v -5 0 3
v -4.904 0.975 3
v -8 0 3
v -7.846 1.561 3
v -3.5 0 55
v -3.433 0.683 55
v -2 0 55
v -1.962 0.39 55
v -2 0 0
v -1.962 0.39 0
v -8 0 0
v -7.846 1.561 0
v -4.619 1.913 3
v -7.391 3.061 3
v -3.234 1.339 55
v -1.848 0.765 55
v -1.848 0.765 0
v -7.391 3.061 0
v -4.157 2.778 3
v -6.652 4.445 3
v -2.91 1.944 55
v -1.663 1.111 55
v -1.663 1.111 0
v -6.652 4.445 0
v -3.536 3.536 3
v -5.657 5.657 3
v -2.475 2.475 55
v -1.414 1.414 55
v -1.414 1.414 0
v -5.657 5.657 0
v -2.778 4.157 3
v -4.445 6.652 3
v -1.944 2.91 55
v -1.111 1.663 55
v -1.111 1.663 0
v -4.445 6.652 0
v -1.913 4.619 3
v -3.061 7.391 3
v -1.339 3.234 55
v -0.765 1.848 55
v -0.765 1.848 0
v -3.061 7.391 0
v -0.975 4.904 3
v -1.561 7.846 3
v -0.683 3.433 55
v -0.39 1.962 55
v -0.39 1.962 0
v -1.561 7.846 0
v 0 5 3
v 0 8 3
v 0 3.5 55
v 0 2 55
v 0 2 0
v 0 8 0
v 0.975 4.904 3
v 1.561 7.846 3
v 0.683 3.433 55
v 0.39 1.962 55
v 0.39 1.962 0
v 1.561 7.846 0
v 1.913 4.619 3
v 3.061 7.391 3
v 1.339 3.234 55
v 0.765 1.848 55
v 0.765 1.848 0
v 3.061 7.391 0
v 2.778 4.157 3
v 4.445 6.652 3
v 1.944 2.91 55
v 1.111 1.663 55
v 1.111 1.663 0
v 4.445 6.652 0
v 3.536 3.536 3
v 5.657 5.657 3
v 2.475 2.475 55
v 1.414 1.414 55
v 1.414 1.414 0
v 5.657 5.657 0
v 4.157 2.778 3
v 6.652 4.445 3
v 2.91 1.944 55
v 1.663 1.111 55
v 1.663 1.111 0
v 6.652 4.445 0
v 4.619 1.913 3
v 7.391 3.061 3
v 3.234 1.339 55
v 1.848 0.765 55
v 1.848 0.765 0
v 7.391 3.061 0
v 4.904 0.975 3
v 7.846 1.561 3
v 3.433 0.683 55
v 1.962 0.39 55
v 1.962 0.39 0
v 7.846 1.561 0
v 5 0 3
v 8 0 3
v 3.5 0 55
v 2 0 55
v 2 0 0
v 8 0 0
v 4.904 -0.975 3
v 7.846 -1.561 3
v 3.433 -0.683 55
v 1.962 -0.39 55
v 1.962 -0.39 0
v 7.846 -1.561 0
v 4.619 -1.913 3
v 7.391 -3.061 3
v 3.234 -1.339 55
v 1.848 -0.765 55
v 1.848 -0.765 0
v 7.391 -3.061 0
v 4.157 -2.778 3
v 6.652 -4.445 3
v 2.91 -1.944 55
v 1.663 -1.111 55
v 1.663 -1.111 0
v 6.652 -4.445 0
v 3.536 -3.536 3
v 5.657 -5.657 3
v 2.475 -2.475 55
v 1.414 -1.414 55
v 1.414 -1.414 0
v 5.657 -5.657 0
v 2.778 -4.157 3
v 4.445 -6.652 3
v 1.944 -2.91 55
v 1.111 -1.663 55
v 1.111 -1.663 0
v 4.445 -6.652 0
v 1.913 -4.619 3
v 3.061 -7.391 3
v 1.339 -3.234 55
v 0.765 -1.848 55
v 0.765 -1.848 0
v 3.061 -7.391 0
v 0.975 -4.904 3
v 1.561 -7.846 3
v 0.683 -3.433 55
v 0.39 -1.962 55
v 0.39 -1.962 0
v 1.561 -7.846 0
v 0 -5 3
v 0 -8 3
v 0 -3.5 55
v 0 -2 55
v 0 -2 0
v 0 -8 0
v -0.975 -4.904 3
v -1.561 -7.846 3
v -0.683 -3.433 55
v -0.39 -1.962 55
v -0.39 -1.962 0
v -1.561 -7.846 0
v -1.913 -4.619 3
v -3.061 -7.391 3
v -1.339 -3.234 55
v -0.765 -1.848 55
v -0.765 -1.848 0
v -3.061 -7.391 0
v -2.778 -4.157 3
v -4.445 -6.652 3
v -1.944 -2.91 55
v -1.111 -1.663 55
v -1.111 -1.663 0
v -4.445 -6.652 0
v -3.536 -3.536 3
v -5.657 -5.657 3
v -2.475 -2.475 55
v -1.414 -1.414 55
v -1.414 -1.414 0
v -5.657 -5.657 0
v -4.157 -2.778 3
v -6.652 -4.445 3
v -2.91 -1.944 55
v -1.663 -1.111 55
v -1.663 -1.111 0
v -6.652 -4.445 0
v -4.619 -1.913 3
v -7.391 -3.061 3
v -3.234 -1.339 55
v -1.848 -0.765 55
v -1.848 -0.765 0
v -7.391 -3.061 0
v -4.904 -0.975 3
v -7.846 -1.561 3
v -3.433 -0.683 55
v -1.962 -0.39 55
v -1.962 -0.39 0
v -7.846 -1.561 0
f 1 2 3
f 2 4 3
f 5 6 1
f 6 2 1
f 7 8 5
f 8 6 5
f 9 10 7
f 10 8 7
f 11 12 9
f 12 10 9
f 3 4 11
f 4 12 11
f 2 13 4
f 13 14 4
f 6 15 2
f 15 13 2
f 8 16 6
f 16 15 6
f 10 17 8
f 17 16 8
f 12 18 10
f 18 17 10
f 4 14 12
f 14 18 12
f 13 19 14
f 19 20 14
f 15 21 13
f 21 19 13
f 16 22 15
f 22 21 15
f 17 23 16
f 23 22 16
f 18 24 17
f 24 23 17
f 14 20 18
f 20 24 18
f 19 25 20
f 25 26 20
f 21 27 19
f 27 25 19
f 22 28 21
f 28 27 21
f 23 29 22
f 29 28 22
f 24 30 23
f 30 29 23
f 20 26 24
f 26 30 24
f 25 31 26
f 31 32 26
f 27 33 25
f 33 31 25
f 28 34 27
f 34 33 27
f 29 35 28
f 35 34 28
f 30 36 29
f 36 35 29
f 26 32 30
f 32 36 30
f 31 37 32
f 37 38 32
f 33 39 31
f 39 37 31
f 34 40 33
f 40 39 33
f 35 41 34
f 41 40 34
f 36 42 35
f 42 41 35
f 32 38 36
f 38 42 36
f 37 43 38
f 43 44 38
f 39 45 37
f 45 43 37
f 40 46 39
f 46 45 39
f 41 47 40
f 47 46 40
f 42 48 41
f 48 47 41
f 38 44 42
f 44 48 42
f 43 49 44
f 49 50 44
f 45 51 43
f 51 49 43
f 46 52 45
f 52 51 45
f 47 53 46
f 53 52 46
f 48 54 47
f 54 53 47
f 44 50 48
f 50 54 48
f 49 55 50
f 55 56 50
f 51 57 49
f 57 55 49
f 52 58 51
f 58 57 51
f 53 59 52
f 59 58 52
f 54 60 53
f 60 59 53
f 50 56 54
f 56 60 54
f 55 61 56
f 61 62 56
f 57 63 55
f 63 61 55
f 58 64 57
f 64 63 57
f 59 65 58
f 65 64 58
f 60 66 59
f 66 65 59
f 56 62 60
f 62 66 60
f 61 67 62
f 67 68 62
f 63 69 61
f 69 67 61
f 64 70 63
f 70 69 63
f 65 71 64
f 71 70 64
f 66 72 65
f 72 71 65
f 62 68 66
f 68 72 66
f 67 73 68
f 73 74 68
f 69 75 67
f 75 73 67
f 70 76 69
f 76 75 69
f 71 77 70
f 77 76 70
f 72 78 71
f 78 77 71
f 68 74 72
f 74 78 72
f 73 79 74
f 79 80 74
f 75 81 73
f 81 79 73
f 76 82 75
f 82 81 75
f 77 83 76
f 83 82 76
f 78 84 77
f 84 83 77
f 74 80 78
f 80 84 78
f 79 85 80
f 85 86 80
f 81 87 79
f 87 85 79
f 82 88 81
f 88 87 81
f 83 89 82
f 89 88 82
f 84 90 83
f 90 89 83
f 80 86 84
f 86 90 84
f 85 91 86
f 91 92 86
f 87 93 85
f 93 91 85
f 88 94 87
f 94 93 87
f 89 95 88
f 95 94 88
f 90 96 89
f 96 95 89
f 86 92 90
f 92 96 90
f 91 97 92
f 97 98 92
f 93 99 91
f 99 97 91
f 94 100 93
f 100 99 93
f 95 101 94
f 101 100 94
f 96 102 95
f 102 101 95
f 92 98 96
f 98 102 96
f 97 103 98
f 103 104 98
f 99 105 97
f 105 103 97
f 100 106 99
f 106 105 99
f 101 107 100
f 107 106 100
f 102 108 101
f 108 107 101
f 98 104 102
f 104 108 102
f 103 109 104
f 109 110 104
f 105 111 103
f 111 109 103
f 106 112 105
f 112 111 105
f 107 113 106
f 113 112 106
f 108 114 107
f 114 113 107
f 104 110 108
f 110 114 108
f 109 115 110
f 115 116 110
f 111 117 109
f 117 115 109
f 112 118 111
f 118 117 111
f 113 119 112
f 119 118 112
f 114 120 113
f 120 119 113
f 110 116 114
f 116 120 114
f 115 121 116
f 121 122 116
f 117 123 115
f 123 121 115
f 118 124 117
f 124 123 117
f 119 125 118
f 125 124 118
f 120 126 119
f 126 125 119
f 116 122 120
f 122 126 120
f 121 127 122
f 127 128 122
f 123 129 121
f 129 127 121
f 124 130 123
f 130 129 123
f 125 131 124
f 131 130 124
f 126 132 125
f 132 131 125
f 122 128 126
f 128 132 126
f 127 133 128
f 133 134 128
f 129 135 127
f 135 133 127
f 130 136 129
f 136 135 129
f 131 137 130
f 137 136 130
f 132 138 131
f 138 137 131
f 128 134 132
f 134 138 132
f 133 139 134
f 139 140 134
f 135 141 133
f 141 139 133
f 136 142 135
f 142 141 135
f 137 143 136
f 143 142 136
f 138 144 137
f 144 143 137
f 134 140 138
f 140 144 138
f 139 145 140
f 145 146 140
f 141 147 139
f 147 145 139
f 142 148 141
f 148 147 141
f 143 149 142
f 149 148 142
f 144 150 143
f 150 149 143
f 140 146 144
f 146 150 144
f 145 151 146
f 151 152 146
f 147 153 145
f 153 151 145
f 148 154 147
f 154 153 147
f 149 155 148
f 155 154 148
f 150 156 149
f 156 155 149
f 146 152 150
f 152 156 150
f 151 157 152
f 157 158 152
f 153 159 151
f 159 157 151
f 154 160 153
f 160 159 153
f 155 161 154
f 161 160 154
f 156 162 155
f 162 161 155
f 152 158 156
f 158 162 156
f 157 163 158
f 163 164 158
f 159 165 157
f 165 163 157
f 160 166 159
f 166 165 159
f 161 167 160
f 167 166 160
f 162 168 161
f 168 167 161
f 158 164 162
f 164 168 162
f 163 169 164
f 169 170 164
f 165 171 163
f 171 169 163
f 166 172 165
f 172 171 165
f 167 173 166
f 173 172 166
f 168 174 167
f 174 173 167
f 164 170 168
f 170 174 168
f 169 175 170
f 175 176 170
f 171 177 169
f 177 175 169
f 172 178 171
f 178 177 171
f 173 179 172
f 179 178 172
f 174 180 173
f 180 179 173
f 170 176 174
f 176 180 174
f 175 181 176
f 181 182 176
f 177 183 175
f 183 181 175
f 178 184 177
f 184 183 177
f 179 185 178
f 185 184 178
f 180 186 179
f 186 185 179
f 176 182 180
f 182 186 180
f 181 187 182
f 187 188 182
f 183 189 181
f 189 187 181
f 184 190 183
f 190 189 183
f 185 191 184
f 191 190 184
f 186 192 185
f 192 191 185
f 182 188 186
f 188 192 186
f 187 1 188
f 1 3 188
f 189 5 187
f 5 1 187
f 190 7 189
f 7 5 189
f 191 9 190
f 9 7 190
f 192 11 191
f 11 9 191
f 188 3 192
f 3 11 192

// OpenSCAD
$fn = 32;

// ----------------------------------------------------------------------
// Profiled standoff: conical spacer, 55 mm long, bore 4 mm
// ----------------------------------------------------------------------

// --- parameters (mm) ---
revolve_angle = 360;      // full turn around the Z axis
profile_points = 6;       // points of the closed outline

profile = [[2, 0], [8, 0], [8, 3], [5, 3], [3.5, 55], [2, 55]];  // single closed polygon, 6 points, counter clockwise

// --- the one profile operation ---
rotate_extrude(angle = revolve_angle) polygon(points = profile);
